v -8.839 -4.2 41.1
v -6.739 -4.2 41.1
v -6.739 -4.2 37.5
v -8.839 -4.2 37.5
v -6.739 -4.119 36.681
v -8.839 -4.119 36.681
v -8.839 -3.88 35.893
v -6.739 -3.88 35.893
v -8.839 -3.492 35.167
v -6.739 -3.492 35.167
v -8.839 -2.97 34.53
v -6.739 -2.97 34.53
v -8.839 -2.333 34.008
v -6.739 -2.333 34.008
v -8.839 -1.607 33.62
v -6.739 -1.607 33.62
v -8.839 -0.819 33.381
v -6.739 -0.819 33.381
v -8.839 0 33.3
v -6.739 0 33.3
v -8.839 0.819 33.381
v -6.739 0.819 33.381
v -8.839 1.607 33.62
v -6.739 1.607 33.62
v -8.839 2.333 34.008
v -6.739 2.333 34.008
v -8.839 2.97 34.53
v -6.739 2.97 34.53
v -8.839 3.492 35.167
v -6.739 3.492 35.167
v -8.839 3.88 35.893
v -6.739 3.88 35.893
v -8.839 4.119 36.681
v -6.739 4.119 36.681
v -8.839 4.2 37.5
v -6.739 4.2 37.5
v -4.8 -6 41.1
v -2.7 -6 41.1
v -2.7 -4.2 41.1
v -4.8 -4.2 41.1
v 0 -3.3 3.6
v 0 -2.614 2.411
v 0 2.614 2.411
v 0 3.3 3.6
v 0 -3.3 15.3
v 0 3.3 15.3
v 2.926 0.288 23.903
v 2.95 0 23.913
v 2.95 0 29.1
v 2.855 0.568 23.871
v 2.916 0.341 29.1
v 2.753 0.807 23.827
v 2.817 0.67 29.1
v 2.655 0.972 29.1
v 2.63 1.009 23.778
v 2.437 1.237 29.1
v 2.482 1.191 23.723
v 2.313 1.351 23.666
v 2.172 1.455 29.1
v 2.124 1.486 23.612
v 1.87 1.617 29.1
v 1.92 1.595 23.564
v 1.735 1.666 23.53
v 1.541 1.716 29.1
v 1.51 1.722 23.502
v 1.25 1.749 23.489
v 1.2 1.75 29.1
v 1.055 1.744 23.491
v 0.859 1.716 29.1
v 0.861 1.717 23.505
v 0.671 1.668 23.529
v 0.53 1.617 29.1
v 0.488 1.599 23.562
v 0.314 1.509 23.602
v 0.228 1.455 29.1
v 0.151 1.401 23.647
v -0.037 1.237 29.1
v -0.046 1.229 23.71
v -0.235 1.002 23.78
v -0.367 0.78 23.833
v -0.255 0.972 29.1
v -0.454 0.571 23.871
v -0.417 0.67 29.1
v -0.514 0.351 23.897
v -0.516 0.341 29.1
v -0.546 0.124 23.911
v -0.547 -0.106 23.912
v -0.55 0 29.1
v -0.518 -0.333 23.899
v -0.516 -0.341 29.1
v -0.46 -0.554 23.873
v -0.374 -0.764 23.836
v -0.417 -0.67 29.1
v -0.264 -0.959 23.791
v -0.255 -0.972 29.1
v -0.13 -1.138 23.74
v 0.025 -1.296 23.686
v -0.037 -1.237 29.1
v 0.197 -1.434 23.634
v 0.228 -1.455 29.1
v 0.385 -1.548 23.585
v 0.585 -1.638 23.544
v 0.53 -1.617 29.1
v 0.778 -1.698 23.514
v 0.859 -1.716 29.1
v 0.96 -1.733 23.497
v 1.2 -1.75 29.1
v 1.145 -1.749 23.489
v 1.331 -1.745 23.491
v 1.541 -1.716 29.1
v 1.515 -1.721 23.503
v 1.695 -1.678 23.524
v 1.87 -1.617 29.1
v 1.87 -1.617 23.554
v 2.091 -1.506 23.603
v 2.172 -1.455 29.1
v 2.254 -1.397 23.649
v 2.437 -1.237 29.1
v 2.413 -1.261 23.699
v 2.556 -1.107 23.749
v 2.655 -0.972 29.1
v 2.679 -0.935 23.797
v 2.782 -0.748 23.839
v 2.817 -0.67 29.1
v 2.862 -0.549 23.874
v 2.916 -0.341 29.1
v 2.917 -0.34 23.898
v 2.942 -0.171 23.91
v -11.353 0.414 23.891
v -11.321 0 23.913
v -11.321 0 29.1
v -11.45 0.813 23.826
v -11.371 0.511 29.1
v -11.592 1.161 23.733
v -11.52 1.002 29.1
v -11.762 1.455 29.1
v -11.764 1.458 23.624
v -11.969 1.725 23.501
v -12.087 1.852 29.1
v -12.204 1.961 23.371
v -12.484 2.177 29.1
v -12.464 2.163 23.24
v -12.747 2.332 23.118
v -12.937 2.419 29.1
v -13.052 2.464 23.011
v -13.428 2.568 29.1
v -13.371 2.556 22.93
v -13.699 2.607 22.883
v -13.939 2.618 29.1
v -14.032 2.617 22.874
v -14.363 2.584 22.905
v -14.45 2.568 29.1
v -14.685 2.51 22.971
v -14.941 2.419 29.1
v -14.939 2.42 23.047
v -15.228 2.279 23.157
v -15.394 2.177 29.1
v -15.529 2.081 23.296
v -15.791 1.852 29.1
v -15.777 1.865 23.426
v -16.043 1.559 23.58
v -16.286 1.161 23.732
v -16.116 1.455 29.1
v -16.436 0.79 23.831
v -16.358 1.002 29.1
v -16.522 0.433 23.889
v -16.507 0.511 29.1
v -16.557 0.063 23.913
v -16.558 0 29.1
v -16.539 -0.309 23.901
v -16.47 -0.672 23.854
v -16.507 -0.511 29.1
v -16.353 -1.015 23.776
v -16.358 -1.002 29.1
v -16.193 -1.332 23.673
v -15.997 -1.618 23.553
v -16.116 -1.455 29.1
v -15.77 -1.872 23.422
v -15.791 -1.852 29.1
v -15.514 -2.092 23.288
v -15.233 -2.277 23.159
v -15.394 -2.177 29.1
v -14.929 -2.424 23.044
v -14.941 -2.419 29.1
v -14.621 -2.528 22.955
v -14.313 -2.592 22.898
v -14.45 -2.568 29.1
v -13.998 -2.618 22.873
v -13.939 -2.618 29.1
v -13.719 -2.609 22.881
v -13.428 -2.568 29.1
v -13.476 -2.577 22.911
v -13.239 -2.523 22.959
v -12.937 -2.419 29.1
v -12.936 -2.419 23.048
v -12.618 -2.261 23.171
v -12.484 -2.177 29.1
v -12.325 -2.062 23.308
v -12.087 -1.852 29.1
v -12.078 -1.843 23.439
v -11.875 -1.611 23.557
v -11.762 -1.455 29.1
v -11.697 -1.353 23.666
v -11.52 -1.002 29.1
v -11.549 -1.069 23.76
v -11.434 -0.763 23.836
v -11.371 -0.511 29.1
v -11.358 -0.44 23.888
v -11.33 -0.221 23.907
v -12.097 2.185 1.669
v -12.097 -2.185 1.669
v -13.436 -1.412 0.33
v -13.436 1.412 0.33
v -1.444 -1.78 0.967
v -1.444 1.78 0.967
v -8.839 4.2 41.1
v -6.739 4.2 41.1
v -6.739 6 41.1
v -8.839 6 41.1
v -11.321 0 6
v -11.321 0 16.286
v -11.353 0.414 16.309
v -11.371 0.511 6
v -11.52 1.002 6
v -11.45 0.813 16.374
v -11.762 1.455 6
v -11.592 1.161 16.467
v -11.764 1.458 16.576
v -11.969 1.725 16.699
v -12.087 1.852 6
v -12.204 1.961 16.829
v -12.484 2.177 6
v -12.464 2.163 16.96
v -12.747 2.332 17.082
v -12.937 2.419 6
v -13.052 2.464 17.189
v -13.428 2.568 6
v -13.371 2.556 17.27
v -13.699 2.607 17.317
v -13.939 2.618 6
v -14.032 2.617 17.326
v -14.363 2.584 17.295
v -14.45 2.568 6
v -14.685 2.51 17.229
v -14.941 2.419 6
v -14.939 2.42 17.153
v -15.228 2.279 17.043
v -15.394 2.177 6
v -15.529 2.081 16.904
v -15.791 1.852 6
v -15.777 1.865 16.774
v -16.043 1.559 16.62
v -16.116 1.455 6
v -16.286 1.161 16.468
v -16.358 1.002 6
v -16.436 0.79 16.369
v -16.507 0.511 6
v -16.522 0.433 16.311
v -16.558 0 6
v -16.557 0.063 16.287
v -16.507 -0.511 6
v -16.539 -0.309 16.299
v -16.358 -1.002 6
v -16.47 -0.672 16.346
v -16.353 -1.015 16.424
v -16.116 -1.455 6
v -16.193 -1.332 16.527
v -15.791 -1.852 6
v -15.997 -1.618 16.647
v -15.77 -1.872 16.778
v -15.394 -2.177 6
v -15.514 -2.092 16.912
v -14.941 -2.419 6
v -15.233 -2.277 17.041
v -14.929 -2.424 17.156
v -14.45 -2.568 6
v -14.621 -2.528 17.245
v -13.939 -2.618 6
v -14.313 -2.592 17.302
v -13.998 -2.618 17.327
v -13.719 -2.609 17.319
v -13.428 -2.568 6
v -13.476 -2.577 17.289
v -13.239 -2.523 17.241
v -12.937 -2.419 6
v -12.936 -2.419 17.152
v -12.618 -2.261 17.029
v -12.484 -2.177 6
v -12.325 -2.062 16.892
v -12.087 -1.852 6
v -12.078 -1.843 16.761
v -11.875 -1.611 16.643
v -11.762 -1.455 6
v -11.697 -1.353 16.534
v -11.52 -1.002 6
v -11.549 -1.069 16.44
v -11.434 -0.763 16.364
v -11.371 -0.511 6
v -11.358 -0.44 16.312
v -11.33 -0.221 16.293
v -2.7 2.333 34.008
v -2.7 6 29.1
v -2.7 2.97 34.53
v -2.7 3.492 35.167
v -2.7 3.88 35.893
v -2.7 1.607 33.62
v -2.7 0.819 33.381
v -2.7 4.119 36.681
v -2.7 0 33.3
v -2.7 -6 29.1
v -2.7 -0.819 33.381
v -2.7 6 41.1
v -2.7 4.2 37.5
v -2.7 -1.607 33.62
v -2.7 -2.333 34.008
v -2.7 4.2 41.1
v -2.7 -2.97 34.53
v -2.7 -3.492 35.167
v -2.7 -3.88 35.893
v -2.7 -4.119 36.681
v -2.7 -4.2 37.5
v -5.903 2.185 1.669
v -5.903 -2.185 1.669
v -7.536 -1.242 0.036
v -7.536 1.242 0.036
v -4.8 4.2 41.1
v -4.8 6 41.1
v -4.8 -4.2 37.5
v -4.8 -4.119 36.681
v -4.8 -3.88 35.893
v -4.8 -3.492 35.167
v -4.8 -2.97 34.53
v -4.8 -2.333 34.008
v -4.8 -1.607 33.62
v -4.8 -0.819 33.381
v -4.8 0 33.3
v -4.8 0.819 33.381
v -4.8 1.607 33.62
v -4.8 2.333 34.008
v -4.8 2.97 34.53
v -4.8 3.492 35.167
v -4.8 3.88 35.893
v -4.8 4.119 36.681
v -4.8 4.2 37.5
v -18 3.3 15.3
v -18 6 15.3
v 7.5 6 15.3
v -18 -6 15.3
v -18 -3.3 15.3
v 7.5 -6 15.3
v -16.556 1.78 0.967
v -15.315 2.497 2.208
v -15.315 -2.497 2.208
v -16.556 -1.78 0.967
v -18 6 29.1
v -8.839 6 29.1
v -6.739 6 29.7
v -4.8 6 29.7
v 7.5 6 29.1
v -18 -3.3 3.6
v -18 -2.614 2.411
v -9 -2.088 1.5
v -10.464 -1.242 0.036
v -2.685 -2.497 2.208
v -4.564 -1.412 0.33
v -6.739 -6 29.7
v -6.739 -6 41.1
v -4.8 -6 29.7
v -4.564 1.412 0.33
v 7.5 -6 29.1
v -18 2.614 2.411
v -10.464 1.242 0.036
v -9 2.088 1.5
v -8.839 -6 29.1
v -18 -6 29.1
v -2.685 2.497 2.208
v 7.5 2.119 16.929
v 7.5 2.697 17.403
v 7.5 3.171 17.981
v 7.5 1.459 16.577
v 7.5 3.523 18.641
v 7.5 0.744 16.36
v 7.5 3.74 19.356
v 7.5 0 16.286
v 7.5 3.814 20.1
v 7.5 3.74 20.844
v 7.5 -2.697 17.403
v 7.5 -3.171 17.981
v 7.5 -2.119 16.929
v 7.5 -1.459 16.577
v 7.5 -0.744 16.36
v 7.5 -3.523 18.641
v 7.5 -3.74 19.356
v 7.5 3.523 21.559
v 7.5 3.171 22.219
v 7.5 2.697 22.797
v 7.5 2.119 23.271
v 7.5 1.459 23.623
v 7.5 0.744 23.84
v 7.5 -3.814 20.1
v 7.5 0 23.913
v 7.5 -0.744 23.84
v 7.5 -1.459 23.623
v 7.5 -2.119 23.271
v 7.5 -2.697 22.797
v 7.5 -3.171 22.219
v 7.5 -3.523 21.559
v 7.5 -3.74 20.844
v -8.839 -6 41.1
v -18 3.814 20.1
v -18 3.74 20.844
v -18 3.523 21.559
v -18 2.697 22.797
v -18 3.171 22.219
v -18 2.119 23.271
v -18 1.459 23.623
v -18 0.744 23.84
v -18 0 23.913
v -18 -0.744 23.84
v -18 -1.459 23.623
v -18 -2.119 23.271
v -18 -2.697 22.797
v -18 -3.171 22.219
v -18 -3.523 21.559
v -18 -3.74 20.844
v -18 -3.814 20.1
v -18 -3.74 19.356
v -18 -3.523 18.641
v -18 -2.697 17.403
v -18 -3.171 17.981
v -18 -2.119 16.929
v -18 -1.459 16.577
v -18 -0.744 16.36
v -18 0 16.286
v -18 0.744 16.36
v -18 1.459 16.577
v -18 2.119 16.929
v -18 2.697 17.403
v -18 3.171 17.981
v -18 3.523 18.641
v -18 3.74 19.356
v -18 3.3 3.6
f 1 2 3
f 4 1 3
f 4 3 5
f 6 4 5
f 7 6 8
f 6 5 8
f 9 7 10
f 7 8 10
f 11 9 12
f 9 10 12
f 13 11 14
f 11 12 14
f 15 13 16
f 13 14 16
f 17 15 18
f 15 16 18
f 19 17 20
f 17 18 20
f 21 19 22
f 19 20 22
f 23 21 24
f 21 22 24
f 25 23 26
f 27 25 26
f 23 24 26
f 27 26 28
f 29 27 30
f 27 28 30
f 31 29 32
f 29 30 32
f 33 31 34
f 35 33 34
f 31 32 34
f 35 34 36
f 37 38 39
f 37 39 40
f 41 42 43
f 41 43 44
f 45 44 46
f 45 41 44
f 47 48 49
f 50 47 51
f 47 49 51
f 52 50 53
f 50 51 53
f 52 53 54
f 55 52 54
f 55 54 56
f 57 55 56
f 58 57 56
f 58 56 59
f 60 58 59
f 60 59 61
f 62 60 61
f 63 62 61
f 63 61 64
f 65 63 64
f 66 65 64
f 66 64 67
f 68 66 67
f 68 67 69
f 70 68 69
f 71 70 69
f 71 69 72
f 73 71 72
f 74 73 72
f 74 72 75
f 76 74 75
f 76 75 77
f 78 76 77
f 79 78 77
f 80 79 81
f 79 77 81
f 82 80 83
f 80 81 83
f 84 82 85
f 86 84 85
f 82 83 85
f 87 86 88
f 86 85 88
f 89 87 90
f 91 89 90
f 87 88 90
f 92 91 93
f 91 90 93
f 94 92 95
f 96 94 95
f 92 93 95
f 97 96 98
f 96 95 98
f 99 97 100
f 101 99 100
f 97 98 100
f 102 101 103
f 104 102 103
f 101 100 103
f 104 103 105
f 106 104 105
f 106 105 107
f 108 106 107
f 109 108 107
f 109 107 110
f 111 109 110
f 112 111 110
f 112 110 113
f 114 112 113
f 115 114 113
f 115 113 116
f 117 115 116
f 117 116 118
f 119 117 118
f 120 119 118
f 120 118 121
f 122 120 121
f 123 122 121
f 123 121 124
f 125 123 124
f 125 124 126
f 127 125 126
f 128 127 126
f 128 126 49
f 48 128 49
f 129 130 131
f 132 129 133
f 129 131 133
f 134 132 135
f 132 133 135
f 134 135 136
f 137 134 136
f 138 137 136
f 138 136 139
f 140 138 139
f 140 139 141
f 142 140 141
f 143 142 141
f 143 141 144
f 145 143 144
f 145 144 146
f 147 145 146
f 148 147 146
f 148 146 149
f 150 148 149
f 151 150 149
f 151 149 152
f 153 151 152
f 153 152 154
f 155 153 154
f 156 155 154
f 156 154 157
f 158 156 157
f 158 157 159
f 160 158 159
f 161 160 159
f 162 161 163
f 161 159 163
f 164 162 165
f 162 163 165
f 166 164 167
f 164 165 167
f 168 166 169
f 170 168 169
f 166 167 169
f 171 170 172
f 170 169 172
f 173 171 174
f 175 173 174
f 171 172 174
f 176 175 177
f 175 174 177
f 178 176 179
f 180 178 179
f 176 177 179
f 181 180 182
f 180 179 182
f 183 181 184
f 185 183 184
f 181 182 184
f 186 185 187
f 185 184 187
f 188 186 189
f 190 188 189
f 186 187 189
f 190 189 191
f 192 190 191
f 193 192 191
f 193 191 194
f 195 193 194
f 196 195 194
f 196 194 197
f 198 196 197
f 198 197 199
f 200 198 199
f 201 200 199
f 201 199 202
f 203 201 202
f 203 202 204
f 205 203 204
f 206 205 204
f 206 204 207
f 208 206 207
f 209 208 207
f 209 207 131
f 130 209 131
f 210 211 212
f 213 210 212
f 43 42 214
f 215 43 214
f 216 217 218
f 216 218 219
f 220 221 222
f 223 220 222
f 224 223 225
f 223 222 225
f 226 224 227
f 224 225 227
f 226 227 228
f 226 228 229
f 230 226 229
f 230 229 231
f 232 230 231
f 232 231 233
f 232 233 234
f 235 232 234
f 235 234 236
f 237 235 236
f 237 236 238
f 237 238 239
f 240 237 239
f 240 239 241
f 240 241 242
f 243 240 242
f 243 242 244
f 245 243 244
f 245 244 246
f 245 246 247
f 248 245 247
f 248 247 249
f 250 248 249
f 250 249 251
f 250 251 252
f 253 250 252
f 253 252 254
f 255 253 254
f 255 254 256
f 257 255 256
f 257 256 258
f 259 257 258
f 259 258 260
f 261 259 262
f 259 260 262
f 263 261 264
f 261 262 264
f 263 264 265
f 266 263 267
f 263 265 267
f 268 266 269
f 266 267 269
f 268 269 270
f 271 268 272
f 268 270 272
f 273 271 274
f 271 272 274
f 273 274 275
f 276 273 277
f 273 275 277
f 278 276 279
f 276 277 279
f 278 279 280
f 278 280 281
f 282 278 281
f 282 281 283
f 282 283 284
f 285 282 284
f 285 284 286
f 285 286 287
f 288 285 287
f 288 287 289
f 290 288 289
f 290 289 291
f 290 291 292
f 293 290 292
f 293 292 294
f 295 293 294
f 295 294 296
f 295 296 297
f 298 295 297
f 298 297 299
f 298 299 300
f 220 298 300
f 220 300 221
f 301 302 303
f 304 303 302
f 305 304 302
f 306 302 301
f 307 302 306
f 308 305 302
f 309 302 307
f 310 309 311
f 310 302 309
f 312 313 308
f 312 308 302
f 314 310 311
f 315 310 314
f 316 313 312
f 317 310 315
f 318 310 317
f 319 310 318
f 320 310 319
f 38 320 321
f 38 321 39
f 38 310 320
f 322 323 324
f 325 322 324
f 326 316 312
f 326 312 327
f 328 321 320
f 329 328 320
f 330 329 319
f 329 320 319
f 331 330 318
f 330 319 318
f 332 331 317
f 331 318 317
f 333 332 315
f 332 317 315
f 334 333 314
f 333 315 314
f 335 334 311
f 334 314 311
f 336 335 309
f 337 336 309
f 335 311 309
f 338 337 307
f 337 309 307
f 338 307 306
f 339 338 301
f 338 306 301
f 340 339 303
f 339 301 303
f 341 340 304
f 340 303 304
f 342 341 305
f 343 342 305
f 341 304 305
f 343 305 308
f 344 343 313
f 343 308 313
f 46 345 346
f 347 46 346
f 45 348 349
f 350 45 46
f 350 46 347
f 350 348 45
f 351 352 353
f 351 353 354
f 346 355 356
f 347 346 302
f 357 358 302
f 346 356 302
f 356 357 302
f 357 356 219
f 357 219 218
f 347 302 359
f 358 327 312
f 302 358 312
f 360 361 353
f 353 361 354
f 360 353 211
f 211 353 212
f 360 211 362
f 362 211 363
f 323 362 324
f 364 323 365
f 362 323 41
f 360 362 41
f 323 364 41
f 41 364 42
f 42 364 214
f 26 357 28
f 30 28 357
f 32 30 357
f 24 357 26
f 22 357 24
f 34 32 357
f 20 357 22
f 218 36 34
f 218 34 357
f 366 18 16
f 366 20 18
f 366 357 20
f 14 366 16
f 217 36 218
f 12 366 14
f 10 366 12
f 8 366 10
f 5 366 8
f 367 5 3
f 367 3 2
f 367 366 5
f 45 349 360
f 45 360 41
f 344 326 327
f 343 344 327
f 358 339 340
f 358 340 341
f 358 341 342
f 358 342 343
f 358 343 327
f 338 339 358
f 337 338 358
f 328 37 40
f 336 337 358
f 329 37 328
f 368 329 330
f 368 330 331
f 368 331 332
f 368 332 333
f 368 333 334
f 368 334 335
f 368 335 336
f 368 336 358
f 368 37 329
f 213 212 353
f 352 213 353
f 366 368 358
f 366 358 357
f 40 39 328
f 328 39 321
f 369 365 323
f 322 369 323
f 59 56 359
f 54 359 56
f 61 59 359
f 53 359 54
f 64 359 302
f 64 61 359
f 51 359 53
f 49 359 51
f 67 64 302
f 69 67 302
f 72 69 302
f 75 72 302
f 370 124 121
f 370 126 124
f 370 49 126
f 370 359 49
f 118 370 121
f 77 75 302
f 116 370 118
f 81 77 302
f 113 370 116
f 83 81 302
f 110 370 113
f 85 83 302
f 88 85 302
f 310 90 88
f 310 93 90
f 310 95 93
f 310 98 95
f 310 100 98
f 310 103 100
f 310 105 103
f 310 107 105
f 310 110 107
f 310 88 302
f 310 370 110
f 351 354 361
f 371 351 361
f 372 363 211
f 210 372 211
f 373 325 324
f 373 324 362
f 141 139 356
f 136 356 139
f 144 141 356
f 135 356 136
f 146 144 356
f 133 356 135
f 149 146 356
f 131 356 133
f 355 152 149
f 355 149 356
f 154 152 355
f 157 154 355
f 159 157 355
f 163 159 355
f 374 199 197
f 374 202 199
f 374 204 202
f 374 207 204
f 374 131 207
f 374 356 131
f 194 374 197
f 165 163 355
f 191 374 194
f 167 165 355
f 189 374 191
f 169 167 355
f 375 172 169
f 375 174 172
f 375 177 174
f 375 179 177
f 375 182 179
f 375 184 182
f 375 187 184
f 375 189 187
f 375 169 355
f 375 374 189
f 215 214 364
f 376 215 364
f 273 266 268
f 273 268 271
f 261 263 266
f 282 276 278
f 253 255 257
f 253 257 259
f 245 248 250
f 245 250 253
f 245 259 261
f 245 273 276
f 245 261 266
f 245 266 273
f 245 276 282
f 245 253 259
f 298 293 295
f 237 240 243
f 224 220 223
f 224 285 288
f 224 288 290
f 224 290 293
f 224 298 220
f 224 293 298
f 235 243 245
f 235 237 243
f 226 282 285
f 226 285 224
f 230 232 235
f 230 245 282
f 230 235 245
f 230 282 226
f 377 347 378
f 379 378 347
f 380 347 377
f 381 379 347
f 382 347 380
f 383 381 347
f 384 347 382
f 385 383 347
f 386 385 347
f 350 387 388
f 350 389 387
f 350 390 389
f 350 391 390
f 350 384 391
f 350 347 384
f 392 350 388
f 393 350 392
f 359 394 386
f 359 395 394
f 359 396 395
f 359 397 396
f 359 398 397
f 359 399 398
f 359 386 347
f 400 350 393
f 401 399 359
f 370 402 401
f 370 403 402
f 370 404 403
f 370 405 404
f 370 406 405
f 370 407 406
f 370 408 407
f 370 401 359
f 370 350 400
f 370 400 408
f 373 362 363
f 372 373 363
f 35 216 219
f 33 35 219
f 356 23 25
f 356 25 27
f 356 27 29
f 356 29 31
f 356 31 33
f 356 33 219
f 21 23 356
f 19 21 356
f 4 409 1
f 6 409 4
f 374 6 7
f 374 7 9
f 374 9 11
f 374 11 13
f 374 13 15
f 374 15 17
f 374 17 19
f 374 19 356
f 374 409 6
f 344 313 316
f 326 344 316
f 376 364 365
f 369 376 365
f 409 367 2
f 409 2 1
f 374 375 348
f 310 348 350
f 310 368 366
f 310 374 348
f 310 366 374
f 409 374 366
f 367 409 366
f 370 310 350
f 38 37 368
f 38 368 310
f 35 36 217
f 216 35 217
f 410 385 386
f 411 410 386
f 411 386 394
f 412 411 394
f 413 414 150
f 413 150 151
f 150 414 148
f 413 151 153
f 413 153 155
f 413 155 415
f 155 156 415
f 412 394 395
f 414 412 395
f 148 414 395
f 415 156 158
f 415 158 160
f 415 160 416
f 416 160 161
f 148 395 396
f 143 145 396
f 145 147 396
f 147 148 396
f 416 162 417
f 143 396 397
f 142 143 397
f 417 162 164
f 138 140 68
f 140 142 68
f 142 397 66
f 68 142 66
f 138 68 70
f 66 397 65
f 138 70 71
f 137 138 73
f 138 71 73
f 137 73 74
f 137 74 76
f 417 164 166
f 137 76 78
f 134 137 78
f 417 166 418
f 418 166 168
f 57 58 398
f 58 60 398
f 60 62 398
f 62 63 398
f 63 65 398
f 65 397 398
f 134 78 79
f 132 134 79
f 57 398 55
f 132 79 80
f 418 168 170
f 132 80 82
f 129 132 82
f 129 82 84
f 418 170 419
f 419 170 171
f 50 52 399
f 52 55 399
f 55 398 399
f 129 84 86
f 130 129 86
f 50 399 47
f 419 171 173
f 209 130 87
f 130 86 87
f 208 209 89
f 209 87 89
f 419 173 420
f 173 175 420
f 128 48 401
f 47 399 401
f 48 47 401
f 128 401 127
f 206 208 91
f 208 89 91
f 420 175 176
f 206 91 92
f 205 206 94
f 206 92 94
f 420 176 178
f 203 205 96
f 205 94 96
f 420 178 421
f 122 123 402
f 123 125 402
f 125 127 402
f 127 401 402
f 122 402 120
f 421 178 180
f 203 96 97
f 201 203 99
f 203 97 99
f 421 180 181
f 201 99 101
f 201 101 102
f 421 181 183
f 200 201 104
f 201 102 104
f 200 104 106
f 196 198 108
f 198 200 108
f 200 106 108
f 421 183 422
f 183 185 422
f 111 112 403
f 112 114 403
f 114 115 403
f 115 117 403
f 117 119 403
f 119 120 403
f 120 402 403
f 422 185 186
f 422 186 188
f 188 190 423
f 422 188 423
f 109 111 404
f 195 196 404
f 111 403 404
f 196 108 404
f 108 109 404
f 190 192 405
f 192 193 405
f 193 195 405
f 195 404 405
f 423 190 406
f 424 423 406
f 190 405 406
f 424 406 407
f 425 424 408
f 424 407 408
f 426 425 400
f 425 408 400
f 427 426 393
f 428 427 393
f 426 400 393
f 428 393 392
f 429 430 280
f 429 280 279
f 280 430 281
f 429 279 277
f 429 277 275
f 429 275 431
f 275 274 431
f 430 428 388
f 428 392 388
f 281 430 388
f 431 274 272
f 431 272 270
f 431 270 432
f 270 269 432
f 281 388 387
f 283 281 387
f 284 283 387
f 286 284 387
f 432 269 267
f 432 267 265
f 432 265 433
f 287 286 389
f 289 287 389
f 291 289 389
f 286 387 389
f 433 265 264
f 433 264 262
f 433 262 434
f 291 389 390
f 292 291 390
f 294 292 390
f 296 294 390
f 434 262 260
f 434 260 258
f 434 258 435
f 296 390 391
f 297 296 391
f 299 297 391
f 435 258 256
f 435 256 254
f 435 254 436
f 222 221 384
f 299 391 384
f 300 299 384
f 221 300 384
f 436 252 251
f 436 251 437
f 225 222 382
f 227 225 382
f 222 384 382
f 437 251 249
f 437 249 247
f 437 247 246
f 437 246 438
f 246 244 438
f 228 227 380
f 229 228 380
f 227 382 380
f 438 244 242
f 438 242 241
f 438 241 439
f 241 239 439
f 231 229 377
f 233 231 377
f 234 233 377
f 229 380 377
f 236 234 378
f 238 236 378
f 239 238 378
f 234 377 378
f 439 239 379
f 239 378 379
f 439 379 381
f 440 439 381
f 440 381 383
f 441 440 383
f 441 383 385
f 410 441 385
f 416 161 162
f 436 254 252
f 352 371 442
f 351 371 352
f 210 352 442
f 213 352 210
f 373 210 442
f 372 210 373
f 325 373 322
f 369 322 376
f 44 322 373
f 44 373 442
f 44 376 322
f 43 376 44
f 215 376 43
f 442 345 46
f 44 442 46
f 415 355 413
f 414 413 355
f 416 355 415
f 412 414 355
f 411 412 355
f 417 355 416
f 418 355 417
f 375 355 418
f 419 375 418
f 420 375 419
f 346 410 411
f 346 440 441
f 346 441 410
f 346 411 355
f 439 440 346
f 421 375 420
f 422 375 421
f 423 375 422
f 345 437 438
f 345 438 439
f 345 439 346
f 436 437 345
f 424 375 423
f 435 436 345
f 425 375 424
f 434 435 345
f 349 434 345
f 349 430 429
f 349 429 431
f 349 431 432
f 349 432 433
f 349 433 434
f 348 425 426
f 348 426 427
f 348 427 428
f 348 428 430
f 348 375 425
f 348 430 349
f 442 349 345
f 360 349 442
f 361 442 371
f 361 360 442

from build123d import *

# Parameters (mm, degrees)
F1_DEPTH    = 2
F0_W        = 6
F0_H        = 5.0999999046
F2_DEPTH    = 1.1
F3_W        = 2.7999999523
F3_H        = 0.2000000477
F4_DEPTH    = 2.0463333095
F5_R        = 1.2711666667
F6_DEPTH    = 8.5
F7_R        = 0.5833333333
F8_DEPTH    = 3
F9_R        = 0.8728333333
F10_DEPTH   = 7.7
F11_SIZE2   = 0.692820323
F11_SIZE    = 1.2
F11_2_SIZE2 = 0.692820323
F11_2_SIZE  = 1.2
F13_DEPTH   = 12.5
F14_SCALE   = 3


with BuildPart() as f1:
    # F0 (on Front) → F1 (new body, symmetric)
    with BuildSketch(Plane.XZ):
        Polygon((-6, 5.0999999046), (0, 5.0999999046), (2.5, 5.0999999046), (2.5, 9.6999998093), (-0.9000000954, 9.6999998093), (-0.9000000954, 13.6999998093), (-1.6000000834, 13.6999998093), (-1.6000000834, 9.8999998569), (-2.2463334168, 9.8999998569), (-2.2463334168, 13.6999998093), (-2.9463334049, 13.6999998093), (-2.9463334049, 9.6999998093), (-6, 9.6999998093), align=None)
    extrude(amount=F1_DEPTH, both=True)

    # F0 (on Front) → F2 (join, symmetric)
    with BuildSketch(Plane.XZ):
        with Locations((-3, 2.5499999523)):
            Rectangle(F0_W, F0_H)
    extrude(amount=F2_DEPTH, both=True)

    # F3 (on face) → F4 (cut, through all)
    with BuildSketch(Plane.YZ.offset(-0.9000000954)):
        with Locations((0, 13.7999998331)):
            Rectangle(F3_W, F3_H)
        with BuildLine():
            Line((-1.3999999762, 13.6999998093), (-1.3999999762, 12.4999998808))
            ThreePointArc((-1.3999999762, 12.4999998808), (0, 11.0999999046), (1.3999999762, 12.4999998808))
            Line((1.3999999762, 12.4999998808), (1.3999999762, 13.6999998093))
            Line((1.3999999762, 13.6999998093), (-1.3999999762, 13.6999998093))
        make_face()
    extrude(amount=-F4_DEPTH, mode=Mode.SUBTRACT)

    # F5 (on face) → F6 (cut)
    with BuildSketch(Plane.YZ.offset(2.5)):
        with Locations((0, 6.6999998093)):
            Circle(F5_R)
    extrude(amount=-F6_DEPTH, mode=Mode.SUBTRACT)

    # F7 (on face) → F8 (cut)
    with BuildSketch(Plane.XY.offset(9.6999998093)):
        with Locations((0.3999998569, 0)):
            Circle(F7_R)
    extrude(amount=-F8_DEPTH, mode=Mode.SUBTRACT)

    # F9 (on face) → F10 (cut)
    with BuildSketch(Plane.XY.offset(9.6999998093)):
        with Locations((-4.6463334525, 0)):
            Circle(F9_R)
    extrude(amount=-F10_DEPTH, mode=Mode.SUBTRACT)

    # F11
    f11_edges = [f1.edges().sort_by_distance(p)[0] for p in [
        (-3, -1.1, 0),
    ]]
    f11_side = f1.faces().sort_by_distance((-3, -1.1, 2.55))[0]
    chamfer(f11_edges, length=F11_SIZE, length2=F11_SIZE2, reference=f11_side)

    # F11#2
    f11_2_edges = [f1.edges().sort_by_distance(p)[0] for p in [
        (-3, 1.1, 0),
    ]]
    f11_2_side = f1.faces().sort_by_distance((-3, 1.1, 2.55))[0]
    chamfer(f11_2_edges, length=F11_2_SIZE, length2=F11_2_SIZE2, reference=f11_2_side)

    # F12 (on Front) → F13 (cut, symmetric)
    with BuildSketch(Plane.XZ):
        Polygon((-2.5119182901, 0.0119182901), (-3, 0.5), (-3.4880817099, 0.0119182901), (-4.0324307496, 0.5562673297), (-4.4787575401, 0.1099405392), (-5.1049532346, 0.7361362337), (-5.518700193, 0.3223892754), (-6, 0.8036890823), (-6, 0), (0, 0), (0, 0.8036890823), (-0.481299807, 0.3223892754), (-0.8950467654, 0.7361362337), (-1.5212424599, 0.1099405392), (-1.9675692504, 0.5562673297), align=None)
    extrude(amount=F13_DEPTH, both=True, mode=Mode.SUBTRACT)


with BuildPart() as f1_1:
    # F14: moved
    add(f1.part.scale(F14_SCALE))


solid = f1_1.part
